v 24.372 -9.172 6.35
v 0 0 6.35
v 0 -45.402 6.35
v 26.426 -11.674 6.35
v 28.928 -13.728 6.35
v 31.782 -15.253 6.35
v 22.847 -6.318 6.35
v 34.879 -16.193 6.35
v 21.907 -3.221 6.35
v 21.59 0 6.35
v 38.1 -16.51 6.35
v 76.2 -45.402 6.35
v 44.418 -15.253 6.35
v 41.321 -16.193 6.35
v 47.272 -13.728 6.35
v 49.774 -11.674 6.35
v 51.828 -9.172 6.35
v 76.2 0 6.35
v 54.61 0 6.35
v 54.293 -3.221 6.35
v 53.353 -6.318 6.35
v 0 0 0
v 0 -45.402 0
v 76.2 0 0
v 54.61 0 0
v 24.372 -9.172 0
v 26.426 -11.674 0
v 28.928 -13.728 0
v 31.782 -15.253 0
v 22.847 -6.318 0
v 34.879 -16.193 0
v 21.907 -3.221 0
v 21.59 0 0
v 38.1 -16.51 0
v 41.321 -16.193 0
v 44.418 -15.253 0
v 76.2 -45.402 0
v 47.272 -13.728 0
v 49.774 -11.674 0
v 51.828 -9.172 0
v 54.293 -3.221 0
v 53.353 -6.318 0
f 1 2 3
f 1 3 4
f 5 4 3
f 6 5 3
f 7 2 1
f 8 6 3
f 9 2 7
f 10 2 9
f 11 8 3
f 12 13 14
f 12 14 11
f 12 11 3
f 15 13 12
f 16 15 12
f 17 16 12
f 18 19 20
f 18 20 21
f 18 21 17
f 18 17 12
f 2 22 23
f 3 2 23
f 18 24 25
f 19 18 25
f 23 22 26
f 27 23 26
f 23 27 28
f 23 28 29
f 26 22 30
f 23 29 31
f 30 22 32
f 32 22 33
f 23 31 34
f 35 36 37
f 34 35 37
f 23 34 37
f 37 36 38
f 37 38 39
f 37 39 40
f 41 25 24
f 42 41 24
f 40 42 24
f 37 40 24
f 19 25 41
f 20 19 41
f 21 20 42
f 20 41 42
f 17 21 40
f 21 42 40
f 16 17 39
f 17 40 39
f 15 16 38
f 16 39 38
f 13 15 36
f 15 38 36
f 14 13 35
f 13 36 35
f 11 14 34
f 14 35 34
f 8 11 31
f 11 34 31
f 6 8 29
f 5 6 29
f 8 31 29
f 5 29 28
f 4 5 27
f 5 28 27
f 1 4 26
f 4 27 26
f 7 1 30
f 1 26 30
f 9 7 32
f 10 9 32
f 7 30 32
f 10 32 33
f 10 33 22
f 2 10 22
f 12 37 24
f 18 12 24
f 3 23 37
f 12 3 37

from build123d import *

# Parameters (mm, degrees)
F1_DEPTH = 6.35


with BuildPart() as f1:
    # F0 (on Top) → F1 (new body)
    with BuildSketch(Plane.XY):
        with BuildLine():
            Line((21.59, 0), (0, 0))
            Line((0, 0), (0, -45.4025))
            Line((0, -45.4025), (76.2, -45.4025))
            Line((76.2, -45.4025), (76.2, 0))
            Line((76.2, 0), (54.61, 0))
            ThreePointArc((54.61, 0), (38.1, -16.51), (21.59, 0))
        make_face()
    extrude(amount=F1_DEPTH)


solid = f1.part
